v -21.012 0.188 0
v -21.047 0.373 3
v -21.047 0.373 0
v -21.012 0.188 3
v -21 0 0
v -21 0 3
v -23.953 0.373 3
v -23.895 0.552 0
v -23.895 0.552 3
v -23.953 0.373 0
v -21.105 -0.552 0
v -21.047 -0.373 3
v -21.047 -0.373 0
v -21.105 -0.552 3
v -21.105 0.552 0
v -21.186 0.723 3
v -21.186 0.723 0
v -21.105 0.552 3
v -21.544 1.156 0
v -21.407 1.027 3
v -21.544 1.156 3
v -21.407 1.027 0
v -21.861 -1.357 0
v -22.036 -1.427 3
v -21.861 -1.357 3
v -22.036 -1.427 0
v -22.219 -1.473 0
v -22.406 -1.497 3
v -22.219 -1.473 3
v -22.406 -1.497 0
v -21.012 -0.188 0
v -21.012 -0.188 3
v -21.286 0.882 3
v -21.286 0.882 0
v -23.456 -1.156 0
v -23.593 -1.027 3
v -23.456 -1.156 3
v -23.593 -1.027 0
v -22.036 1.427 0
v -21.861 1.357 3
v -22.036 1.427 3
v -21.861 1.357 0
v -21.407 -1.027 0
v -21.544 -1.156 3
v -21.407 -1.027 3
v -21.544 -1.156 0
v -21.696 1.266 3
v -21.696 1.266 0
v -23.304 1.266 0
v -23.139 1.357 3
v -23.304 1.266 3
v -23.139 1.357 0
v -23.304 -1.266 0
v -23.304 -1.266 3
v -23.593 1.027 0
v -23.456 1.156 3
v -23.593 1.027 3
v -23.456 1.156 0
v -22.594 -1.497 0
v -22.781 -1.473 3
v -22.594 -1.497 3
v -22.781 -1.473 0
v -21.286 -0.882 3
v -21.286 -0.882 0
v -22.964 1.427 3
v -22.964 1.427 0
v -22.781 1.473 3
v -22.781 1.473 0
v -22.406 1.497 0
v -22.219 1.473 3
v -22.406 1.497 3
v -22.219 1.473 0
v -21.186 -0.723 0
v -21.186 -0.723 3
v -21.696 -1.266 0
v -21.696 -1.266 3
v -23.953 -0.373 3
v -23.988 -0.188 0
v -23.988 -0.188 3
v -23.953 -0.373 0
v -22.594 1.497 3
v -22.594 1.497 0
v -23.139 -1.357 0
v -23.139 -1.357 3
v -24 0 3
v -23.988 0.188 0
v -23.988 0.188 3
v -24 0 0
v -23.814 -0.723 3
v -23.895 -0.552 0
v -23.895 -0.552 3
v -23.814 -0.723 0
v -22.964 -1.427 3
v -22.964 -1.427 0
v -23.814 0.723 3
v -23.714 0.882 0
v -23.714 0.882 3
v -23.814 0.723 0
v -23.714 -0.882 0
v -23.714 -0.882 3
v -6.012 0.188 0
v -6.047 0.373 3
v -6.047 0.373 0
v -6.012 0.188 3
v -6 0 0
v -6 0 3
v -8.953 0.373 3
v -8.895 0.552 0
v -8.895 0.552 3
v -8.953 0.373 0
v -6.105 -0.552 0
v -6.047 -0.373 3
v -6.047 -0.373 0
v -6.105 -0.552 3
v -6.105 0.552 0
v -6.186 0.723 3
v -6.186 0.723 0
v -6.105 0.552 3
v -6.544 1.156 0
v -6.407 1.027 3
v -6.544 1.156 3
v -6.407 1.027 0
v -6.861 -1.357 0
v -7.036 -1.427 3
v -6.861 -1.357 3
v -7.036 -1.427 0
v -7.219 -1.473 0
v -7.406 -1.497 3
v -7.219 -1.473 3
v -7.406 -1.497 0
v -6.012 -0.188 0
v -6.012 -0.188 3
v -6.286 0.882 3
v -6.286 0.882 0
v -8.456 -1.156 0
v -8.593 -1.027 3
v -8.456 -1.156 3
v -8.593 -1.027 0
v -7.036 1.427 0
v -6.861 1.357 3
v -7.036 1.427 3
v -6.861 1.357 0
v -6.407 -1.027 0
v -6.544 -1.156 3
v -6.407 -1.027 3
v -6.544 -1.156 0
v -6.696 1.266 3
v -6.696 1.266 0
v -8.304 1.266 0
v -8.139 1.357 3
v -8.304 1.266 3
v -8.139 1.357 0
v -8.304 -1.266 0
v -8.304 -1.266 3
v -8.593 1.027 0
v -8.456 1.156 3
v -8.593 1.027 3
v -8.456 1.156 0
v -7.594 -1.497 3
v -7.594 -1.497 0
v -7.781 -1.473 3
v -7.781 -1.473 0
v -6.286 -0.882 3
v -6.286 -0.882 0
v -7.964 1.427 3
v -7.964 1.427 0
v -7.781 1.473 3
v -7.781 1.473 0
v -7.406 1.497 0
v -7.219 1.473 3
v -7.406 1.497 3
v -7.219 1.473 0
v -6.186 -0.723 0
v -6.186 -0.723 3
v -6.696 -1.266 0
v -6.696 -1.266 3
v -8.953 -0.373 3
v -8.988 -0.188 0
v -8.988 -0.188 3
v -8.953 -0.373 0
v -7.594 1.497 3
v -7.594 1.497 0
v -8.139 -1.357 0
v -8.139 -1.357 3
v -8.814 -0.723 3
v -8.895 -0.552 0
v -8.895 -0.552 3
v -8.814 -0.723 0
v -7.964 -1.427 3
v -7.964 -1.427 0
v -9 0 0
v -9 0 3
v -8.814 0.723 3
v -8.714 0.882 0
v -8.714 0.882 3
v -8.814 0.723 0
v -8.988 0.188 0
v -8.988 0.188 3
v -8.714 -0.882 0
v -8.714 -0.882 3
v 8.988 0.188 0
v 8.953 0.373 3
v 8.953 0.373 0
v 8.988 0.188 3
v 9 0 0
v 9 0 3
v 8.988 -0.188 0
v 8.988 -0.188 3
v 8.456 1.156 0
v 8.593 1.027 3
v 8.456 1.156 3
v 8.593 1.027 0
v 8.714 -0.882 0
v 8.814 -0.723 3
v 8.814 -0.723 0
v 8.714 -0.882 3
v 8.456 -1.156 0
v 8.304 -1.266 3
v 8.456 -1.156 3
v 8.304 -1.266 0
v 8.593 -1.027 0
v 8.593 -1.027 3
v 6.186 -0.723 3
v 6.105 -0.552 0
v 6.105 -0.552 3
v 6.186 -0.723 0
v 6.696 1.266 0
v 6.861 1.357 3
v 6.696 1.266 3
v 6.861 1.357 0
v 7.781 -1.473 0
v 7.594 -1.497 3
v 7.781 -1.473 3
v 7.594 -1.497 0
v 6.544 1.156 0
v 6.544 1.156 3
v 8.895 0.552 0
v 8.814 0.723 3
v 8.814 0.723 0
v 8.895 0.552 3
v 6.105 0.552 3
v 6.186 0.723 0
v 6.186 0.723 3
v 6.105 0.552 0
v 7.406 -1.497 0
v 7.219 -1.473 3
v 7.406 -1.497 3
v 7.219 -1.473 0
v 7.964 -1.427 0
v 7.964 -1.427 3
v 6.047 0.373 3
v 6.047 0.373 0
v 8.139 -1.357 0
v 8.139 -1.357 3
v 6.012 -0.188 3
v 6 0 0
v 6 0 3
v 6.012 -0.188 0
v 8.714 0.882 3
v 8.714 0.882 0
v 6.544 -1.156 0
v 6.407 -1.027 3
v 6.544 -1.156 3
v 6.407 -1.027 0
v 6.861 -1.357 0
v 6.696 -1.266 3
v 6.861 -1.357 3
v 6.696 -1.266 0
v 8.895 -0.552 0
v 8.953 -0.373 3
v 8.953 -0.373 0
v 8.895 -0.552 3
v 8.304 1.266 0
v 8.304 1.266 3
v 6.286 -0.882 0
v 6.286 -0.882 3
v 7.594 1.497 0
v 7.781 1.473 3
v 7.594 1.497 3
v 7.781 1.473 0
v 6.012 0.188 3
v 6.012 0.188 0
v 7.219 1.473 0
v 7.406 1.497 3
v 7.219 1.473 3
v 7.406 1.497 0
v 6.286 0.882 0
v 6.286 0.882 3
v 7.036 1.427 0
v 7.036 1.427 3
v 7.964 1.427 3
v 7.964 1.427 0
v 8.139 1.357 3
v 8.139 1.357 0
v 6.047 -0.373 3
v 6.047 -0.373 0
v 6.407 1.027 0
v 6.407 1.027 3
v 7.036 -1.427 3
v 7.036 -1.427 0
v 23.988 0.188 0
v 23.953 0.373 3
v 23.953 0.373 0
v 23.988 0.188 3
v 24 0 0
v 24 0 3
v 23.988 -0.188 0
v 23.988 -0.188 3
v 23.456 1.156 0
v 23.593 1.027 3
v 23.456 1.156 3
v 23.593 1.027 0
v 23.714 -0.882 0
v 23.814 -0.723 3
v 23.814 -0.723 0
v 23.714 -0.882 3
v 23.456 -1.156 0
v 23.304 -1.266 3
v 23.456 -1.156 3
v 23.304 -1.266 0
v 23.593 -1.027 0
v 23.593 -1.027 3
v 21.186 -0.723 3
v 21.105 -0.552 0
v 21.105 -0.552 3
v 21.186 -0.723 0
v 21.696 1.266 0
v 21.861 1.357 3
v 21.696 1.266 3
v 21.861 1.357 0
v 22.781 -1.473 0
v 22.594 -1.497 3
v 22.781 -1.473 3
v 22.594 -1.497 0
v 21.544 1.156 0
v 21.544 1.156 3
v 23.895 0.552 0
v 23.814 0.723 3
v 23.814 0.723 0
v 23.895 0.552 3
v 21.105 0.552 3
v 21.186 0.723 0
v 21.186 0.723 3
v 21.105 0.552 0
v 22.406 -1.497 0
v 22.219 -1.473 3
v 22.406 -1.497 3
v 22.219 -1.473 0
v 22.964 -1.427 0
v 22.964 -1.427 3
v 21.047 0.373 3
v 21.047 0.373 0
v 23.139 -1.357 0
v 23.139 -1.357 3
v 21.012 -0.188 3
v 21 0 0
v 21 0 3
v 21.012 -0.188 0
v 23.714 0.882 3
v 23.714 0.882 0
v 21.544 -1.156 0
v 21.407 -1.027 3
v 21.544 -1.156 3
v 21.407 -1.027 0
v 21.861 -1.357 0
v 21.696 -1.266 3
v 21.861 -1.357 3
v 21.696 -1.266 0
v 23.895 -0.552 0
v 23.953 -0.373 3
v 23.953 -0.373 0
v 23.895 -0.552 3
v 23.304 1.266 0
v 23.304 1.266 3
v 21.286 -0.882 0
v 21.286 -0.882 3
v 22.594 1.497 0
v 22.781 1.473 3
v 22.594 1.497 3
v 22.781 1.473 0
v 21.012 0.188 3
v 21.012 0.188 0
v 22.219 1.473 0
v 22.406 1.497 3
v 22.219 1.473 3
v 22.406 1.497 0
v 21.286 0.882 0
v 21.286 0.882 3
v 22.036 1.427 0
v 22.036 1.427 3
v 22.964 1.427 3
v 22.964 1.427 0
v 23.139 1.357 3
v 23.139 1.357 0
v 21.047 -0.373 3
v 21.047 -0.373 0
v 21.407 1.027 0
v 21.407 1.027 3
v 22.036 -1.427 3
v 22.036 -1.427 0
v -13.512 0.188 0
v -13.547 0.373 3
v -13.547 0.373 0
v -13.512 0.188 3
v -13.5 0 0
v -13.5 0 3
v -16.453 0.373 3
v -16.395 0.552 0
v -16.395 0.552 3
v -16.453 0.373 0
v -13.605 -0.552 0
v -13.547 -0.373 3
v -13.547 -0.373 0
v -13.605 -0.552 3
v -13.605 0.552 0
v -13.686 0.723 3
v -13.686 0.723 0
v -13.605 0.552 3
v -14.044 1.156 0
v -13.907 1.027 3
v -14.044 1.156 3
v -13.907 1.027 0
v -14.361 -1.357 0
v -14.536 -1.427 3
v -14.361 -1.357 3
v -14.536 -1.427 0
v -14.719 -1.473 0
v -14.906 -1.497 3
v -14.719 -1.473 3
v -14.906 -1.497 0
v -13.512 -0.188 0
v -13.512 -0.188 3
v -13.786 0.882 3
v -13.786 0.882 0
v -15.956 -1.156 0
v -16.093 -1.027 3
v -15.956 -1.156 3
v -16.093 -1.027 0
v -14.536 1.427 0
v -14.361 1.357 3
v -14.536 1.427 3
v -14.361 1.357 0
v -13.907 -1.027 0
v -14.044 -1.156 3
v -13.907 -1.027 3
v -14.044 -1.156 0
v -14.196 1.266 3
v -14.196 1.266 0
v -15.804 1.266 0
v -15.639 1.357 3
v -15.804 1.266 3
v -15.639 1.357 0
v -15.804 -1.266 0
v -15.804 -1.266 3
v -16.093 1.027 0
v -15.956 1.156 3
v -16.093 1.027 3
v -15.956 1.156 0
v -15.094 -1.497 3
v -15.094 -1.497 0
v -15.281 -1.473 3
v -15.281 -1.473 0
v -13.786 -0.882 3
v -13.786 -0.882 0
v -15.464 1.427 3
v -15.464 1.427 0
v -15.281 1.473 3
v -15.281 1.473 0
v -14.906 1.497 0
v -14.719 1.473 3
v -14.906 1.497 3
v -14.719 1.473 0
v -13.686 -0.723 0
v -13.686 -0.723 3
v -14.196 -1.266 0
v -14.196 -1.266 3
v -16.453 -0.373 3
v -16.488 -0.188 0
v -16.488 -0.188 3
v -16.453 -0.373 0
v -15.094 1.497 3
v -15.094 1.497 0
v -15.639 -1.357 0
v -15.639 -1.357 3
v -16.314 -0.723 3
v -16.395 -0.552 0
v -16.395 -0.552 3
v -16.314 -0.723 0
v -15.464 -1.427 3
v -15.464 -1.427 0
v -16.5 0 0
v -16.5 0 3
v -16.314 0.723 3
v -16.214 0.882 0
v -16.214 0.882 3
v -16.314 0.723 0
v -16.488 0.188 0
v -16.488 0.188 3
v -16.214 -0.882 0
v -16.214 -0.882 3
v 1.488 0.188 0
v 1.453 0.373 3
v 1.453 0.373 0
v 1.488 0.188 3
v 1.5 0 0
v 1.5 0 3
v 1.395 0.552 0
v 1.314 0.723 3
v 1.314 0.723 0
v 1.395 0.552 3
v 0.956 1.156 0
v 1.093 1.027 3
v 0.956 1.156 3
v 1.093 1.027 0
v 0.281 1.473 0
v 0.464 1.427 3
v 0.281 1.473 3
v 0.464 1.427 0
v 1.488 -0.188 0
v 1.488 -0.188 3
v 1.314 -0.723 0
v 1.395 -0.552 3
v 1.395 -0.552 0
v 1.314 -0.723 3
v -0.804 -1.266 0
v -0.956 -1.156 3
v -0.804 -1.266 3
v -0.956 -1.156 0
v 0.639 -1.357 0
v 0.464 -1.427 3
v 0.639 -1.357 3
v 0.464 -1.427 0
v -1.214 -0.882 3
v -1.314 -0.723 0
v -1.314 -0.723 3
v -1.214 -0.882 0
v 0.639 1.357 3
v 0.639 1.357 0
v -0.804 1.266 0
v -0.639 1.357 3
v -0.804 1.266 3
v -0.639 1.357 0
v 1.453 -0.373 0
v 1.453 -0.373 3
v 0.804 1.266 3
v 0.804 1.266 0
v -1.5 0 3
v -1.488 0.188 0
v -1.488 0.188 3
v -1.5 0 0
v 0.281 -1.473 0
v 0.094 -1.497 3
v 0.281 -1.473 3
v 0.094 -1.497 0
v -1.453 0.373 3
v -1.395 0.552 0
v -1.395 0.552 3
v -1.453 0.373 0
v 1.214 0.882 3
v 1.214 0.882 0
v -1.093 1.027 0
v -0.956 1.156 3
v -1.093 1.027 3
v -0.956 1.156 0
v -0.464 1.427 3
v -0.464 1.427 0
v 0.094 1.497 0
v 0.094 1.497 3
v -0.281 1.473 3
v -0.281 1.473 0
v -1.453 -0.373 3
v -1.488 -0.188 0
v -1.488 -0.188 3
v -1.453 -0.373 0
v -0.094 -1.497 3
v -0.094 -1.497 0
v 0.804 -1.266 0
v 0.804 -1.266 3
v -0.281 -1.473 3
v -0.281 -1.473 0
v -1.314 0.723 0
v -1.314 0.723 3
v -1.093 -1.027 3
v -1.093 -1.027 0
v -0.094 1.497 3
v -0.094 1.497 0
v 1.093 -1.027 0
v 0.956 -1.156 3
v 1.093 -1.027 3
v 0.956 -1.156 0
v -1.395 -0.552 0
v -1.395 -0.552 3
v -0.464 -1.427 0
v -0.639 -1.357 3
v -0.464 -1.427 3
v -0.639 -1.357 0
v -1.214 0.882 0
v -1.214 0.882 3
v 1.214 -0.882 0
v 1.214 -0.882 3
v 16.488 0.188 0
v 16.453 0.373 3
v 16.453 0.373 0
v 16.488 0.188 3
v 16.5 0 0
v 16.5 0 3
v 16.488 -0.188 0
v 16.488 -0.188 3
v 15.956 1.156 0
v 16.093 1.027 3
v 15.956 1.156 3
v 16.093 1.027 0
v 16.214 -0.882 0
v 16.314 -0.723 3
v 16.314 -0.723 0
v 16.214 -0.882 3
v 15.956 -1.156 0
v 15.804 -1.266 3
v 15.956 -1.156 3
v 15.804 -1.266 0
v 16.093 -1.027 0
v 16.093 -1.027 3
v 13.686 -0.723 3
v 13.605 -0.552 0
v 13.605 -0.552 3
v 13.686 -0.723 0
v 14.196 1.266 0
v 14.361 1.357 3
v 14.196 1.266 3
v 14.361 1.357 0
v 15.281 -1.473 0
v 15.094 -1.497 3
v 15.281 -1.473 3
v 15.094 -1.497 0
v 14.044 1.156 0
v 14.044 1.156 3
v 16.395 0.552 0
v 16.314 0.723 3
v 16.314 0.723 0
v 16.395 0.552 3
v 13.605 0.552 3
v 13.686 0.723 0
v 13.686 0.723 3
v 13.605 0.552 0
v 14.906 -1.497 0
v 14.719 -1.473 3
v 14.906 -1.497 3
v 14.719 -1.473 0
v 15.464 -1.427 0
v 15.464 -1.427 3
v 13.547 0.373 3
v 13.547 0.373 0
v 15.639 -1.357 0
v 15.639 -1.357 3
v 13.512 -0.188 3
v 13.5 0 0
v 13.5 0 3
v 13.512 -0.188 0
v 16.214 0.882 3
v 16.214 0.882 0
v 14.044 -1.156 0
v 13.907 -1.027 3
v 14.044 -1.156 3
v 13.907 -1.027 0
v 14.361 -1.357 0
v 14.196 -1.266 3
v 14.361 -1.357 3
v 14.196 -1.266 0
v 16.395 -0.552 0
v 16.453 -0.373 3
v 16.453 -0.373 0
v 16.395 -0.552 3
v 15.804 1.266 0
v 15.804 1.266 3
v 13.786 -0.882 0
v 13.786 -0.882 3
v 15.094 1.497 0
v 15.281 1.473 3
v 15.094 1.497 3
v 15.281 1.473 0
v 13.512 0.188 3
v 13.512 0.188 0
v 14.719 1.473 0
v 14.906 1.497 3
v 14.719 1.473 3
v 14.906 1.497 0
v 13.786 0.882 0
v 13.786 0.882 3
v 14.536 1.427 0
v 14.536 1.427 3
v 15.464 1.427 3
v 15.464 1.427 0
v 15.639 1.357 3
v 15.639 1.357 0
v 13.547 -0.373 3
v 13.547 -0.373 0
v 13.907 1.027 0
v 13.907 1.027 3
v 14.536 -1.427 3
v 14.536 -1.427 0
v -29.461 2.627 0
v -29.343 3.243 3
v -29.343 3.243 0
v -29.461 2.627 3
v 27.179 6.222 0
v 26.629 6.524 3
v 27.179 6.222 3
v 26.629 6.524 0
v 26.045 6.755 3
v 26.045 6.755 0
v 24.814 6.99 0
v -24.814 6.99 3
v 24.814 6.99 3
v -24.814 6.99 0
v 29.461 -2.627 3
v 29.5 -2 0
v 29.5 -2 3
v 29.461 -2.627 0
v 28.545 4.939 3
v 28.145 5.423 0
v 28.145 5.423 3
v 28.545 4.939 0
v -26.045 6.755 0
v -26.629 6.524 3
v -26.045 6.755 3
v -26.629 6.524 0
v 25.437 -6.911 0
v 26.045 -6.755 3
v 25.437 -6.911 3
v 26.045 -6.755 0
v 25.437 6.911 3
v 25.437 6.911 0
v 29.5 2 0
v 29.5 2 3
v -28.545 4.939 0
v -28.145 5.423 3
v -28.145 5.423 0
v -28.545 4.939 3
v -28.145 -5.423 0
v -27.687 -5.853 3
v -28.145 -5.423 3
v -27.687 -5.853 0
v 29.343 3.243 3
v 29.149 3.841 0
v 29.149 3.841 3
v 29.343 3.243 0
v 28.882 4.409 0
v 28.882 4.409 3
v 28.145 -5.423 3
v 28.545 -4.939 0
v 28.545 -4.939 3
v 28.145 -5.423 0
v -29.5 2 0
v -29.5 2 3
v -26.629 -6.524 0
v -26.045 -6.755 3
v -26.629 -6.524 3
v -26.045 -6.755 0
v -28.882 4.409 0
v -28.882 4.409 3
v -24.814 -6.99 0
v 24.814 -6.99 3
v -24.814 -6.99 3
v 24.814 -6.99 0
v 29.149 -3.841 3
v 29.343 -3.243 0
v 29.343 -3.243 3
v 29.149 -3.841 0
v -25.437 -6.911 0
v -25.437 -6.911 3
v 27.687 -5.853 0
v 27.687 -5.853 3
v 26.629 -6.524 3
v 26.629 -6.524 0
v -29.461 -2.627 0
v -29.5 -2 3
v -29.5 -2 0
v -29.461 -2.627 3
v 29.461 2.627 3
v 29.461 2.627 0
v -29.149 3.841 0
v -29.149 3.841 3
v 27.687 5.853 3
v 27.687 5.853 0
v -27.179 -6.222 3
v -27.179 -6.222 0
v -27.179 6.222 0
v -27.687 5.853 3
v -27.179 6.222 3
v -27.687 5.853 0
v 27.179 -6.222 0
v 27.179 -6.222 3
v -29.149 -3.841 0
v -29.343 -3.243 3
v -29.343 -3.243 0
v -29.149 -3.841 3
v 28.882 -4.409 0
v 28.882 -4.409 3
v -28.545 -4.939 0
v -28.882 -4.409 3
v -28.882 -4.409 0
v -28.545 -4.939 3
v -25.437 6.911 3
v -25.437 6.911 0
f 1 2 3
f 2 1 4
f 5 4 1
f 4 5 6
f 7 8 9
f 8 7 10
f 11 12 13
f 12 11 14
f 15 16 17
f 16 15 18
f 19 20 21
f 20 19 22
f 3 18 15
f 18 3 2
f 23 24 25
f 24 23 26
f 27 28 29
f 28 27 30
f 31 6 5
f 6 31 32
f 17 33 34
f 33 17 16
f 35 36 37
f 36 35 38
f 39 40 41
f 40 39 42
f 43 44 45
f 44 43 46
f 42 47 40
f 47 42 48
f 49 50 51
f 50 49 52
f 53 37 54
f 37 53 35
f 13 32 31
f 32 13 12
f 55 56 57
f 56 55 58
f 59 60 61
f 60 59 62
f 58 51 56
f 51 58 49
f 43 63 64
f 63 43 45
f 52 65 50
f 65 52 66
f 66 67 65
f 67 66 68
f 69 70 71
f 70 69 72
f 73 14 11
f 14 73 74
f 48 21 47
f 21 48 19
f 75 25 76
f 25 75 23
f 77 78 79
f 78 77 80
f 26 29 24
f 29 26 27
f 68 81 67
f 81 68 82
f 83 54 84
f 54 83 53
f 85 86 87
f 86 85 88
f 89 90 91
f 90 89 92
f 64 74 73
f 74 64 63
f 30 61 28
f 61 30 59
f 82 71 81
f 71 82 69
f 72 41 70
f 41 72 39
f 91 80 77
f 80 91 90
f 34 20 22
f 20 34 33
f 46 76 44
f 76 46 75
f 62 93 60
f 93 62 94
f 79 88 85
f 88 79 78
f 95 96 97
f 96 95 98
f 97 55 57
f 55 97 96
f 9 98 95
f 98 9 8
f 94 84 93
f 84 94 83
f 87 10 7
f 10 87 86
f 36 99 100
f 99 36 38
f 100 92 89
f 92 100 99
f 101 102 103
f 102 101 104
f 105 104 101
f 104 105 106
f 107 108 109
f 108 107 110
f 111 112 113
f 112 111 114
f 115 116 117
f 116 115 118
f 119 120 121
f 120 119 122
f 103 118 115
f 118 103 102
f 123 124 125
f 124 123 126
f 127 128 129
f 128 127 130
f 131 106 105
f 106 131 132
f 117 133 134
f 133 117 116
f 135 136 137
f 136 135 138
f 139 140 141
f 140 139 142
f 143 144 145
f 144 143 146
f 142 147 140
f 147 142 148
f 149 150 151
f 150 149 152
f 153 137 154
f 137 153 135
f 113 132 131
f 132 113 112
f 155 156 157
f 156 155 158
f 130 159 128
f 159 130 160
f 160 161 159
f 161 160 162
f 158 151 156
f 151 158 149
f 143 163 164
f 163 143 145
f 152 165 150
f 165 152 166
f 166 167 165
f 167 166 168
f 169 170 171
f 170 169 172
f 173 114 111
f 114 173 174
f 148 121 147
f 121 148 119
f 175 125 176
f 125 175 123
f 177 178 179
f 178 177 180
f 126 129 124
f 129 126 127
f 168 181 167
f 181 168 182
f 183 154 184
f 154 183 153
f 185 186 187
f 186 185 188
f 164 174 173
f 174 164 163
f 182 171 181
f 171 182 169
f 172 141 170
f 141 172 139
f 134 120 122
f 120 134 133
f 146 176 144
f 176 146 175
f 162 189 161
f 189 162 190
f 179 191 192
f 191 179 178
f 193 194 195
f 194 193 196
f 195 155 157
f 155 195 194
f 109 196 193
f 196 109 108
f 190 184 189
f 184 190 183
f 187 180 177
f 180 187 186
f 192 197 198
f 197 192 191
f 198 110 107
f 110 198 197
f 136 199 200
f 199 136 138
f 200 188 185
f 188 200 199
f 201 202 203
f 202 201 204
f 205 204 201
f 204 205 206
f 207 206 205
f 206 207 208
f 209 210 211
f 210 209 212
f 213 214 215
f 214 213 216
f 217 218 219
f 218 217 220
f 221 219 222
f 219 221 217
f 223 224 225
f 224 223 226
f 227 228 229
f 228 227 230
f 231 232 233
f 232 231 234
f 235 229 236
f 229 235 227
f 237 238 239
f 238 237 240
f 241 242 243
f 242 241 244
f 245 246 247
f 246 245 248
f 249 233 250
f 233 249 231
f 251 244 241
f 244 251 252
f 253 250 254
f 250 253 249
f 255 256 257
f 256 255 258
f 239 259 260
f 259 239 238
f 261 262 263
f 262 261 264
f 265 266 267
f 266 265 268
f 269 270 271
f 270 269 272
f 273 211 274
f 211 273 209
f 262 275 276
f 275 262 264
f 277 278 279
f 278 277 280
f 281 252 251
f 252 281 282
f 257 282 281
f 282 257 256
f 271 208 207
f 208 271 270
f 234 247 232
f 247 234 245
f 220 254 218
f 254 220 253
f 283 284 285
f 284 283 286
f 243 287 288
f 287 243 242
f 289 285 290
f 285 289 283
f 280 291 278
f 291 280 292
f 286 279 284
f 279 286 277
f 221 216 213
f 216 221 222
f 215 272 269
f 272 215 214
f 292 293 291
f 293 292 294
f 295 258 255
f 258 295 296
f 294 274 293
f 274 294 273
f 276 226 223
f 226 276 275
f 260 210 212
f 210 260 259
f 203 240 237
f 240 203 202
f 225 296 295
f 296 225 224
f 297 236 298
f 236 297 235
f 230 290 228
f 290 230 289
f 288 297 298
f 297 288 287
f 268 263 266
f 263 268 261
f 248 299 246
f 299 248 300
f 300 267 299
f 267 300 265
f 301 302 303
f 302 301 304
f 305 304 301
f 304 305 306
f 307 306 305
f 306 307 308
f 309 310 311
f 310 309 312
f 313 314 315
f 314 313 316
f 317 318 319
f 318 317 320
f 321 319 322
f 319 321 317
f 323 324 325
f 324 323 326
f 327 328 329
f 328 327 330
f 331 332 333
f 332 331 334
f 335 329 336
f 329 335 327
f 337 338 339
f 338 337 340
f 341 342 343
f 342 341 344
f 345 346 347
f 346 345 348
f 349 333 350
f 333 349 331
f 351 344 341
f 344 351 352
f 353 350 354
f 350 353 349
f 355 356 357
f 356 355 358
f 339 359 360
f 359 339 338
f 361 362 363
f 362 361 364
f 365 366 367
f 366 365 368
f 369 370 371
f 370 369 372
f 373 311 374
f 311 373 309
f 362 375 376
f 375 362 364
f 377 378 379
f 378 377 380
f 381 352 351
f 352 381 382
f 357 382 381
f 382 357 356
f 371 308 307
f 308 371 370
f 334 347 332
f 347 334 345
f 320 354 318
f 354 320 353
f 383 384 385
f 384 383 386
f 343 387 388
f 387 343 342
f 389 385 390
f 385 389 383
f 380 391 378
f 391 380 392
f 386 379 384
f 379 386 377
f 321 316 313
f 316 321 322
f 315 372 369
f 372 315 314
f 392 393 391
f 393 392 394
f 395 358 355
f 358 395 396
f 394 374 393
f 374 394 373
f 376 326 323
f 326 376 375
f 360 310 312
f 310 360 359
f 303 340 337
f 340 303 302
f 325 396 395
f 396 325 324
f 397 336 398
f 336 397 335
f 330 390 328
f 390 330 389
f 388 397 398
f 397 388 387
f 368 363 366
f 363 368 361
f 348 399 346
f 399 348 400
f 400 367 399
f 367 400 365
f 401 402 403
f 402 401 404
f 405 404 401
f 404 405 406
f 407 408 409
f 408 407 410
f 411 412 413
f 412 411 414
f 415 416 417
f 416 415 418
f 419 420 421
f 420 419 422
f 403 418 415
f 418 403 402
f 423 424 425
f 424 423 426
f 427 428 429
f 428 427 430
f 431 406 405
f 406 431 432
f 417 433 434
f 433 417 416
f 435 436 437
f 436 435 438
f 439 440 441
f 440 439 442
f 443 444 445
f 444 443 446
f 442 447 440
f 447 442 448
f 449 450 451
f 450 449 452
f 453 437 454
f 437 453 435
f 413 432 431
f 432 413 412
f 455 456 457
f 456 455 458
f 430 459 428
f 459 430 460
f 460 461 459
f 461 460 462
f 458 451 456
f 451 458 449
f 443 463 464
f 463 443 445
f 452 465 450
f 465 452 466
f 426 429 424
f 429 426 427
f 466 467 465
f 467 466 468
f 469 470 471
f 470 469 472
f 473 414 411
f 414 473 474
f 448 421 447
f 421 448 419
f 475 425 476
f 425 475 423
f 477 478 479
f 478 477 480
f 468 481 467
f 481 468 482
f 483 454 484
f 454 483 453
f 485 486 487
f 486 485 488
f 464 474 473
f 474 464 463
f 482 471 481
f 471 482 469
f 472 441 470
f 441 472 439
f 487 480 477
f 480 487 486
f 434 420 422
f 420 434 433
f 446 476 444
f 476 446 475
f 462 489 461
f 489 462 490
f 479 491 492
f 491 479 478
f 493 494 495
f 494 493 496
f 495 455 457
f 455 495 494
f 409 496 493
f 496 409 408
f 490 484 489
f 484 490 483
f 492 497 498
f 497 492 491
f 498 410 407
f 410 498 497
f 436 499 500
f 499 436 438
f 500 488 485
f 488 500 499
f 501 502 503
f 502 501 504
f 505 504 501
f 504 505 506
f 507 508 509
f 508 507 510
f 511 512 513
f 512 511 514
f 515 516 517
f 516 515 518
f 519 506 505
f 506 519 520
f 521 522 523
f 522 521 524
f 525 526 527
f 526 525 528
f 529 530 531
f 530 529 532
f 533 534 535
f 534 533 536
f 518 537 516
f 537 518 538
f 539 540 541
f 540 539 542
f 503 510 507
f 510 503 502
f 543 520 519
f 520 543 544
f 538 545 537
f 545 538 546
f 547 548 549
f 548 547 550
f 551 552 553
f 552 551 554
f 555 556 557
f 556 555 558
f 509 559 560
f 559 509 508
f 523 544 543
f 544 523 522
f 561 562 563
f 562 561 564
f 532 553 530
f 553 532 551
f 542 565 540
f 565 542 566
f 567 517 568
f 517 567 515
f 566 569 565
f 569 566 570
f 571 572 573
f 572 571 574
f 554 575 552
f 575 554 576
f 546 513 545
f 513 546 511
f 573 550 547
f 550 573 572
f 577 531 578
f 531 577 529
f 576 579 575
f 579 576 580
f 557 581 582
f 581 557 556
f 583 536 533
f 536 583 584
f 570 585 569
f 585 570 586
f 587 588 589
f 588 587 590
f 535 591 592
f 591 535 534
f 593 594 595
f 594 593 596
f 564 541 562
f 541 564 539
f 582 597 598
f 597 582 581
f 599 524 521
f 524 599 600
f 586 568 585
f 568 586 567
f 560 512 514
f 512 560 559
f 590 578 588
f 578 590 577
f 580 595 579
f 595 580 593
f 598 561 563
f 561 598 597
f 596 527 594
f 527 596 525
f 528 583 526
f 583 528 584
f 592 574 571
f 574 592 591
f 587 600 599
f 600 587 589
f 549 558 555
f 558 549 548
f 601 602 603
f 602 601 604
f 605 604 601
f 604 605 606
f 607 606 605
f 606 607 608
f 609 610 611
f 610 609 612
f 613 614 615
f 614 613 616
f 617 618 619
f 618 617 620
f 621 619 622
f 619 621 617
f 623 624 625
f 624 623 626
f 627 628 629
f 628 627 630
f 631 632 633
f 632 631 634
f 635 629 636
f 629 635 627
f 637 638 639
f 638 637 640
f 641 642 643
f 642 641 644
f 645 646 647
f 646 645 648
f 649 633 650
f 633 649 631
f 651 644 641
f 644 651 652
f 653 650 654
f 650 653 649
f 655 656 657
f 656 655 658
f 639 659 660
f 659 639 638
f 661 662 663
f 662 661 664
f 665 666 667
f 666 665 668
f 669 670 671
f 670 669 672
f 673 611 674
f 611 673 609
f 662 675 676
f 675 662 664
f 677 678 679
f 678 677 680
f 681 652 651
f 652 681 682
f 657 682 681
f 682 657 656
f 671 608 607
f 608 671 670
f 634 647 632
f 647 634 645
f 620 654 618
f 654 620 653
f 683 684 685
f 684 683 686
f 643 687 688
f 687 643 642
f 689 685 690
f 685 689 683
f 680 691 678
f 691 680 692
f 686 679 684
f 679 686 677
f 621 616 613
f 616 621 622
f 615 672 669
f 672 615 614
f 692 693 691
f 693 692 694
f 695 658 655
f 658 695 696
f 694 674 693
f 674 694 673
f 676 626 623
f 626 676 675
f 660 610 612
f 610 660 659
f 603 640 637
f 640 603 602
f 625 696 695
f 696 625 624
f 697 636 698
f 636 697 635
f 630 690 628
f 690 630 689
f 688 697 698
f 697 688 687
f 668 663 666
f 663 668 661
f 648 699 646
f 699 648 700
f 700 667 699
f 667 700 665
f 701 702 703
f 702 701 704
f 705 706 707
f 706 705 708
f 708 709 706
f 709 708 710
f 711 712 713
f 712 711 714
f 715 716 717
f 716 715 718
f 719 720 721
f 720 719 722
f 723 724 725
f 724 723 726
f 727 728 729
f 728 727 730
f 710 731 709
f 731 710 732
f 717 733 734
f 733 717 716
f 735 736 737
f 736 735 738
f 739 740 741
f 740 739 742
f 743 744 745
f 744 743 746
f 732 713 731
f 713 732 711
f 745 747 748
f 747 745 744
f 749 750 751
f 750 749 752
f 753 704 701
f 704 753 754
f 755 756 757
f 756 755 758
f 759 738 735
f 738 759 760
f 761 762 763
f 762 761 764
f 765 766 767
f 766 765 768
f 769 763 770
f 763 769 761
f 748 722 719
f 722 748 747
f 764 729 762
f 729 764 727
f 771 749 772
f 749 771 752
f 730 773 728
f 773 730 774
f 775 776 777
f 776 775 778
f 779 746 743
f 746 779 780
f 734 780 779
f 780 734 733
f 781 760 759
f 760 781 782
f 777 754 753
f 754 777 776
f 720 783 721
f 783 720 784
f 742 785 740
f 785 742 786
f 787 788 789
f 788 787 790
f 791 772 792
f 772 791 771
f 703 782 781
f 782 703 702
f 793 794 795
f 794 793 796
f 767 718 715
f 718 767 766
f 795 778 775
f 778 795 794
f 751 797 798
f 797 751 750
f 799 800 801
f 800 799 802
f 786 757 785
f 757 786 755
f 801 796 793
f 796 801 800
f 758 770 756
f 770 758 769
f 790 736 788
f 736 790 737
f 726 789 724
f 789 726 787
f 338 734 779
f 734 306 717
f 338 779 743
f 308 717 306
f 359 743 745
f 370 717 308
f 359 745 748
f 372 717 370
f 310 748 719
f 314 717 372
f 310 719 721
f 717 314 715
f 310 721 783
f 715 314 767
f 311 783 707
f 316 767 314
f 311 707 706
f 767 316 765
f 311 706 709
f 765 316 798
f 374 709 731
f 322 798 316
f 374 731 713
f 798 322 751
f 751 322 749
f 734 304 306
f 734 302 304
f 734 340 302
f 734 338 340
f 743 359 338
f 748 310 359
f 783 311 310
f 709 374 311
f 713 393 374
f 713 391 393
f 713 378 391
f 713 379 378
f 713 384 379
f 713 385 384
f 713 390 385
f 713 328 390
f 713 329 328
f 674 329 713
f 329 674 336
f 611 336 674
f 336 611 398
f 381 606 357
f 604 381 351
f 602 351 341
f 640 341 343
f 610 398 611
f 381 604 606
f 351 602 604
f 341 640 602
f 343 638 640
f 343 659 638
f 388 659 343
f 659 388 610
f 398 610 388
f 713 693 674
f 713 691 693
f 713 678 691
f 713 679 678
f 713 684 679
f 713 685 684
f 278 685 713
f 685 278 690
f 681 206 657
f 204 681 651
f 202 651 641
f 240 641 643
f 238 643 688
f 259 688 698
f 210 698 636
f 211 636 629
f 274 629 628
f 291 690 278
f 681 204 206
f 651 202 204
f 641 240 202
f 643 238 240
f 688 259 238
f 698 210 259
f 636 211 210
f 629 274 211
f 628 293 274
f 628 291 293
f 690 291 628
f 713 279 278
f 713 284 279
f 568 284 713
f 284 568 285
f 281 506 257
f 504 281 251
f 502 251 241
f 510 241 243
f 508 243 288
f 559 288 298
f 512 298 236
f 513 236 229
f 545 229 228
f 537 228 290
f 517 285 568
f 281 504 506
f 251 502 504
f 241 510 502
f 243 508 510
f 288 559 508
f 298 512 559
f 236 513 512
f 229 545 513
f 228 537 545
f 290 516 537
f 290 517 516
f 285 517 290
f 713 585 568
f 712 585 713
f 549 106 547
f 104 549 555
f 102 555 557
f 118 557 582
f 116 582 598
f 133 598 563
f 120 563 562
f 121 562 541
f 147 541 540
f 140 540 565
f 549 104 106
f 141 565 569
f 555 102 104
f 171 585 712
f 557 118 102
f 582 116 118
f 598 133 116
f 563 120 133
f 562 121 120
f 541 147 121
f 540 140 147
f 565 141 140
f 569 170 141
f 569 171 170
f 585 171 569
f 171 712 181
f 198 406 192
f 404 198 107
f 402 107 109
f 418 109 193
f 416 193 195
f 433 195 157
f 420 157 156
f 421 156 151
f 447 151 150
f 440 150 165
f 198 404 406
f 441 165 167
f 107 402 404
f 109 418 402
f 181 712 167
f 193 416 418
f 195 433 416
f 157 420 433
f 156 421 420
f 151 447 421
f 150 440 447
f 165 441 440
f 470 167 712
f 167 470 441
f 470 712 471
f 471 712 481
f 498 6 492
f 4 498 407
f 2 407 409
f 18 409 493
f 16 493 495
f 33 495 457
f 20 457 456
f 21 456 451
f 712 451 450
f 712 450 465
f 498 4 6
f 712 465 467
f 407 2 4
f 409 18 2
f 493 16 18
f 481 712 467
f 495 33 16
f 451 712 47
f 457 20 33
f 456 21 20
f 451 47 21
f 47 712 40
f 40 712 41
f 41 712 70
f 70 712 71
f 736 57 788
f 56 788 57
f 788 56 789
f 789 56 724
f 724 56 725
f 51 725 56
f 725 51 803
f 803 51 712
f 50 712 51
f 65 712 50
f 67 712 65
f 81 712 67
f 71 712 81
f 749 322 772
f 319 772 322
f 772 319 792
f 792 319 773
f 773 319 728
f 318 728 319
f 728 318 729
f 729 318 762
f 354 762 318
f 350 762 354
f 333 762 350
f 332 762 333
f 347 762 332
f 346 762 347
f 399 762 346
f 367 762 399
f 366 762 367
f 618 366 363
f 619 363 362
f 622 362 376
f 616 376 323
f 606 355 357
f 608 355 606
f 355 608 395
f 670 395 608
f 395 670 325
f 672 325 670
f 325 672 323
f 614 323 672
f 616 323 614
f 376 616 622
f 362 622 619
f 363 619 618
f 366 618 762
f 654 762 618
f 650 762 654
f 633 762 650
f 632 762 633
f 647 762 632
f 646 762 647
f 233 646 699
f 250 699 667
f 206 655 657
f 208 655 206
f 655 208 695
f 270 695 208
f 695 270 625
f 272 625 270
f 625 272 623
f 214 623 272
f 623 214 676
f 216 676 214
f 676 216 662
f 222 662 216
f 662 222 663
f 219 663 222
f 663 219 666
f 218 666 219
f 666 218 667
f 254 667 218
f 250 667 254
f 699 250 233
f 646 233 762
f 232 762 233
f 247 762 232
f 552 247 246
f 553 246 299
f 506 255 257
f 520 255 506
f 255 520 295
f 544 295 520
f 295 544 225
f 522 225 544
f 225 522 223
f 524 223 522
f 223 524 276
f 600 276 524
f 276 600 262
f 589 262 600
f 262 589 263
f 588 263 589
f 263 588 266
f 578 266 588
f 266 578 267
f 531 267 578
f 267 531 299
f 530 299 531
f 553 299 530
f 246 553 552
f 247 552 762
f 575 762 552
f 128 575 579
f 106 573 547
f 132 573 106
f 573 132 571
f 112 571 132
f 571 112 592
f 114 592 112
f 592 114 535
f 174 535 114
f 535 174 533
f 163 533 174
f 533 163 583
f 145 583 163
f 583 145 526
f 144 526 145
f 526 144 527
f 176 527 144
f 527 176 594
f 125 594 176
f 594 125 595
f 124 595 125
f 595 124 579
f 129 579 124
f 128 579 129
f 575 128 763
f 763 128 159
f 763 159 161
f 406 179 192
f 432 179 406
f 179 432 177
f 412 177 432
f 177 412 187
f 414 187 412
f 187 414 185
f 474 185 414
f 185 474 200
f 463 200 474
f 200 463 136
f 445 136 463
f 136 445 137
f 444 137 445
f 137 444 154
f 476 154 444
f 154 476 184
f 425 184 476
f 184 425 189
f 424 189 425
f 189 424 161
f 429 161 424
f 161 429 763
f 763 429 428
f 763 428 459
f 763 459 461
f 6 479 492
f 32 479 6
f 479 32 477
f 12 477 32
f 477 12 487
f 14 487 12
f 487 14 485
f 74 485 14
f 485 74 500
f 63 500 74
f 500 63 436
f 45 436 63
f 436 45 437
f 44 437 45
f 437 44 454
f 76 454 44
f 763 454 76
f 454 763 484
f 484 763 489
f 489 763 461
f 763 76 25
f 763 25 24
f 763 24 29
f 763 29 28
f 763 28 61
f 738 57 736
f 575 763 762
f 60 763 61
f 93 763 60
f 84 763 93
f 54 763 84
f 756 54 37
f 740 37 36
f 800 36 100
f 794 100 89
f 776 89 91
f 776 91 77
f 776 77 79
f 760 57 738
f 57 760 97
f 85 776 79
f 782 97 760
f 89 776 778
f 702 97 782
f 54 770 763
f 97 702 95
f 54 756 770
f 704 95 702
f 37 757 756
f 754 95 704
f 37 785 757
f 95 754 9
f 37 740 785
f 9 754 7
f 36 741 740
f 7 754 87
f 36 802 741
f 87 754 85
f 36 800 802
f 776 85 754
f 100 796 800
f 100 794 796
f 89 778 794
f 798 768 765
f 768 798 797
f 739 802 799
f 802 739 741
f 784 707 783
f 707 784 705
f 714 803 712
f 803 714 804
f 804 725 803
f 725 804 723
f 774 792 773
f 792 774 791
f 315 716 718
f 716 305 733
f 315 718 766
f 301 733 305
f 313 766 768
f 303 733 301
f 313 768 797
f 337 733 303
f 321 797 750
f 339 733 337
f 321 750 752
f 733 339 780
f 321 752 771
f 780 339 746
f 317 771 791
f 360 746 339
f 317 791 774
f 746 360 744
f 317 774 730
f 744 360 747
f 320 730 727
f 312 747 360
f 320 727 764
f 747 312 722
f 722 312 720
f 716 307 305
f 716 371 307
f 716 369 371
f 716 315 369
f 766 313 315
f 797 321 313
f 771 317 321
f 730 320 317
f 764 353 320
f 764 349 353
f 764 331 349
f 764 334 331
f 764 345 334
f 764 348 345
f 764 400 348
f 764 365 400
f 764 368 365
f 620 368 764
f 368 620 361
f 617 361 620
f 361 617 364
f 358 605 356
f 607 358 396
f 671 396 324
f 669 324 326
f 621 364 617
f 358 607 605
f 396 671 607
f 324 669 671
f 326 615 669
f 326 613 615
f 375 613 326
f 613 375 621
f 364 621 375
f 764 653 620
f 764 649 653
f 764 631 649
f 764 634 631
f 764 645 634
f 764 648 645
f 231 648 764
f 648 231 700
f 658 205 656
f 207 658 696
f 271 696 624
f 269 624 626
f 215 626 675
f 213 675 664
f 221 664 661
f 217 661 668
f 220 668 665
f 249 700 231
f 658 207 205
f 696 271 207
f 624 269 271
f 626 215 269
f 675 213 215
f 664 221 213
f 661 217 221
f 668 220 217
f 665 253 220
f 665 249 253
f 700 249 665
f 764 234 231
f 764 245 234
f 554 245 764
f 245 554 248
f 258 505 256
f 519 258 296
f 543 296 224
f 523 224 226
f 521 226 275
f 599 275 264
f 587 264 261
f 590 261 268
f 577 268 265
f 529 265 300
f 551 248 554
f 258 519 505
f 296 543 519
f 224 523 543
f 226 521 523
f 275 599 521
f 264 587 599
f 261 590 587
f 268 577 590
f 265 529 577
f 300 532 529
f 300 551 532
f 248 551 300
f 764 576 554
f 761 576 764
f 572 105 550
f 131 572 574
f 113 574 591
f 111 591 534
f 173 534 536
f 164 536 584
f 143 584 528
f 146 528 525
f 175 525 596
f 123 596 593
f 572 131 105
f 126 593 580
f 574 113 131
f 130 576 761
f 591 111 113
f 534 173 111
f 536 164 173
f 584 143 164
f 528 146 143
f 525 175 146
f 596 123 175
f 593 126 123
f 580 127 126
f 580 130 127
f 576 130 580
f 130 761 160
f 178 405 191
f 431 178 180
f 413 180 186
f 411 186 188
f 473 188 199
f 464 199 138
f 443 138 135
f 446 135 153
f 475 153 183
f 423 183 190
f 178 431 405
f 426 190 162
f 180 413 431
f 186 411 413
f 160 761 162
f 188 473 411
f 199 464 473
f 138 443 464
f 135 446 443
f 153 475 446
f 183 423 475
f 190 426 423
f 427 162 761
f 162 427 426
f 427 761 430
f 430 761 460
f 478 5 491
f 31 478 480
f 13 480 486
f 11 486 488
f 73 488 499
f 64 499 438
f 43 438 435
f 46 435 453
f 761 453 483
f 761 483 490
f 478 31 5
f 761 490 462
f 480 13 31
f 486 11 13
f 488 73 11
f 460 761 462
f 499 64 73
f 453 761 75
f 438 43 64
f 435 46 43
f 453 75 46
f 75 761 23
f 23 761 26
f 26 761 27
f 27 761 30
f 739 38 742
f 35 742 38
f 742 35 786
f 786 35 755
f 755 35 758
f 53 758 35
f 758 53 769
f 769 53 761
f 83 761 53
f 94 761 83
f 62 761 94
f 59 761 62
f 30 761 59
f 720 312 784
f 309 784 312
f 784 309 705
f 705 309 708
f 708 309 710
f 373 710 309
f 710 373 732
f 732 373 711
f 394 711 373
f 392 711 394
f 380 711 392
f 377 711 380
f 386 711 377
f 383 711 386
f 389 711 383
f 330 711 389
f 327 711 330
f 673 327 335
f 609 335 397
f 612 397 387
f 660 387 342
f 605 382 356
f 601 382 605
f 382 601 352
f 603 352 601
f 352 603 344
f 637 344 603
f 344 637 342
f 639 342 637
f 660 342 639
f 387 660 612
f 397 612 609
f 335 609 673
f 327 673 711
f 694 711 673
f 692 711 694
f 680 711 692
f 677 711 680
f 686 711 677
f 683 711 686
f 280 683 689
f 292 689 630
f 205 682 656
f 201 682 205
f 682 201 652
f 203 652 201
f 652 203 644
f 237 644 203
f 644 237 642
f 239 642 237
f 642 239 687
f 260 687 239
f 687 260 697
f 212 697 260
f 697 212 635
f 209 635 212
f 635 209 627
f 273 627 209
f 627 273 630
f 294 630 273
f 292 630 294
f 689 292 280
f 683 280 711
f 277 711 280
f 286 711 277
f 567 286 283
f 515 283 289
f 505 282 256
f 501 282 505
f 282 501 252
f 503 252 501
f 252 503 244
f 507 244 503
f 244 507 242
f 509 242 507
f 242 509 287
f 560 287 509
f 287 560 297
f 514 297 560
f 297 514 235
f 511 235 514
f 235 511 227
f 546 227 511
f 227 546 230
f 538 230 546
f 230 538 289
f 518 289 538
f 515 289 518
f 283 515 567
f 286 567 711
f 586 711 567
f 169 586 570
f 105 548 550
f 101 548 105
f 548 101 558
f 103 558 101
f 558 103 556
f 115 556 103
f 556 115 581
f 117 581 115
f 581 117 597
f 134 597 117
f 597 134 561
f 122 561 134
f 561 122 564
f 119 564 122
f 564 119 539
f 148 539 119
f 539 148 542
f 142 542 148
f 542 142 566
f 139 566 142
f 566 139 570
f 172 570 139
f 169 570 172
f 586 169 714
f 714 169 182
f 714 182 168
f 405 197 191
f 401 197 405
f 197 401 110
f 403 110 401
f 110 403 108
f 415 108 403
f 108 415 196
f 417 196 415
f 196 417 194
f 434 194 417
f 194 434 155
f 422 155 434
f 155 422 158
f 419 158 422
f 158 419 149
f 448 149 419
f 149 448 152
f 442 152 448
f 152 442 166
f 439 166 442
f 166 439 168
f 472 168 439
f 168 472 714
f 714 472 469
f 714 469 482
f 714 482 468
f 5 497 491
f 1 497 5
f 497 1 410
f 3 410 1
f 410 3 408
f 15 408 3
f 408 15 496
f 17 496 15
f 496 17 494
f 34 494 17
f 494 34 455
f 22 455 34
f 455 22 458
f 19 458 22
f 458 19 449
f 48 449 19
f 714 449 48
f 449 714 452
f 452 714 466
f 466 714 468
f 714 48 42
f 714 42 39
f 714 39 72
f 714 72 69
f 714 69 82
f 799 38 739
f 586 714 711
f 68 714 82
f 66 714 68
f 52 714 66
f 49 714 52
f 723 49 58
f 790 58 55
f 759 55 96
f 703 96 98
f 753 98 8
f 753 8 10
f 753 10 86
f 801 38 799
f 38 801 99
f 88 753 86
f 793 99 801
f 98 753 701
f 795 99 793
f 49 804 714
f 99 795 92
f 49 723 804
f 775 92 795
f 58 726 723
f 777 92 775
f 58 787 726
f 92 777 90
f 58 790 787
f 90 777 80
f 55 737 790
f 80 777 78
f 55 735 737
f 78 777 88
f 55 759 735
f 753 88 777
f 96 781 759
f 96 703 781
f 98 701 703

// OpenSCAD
$fn = 50;


difference() {
	union() {
		hull() {
			translate(v = [-24.5000000000, 2.0000000000, 0]) {
				cylinder(h = 3, r = 5);
			}
			translate(v = [24.5000000000, 2.0000000000, 0]) {
				cylinder(h = 3, r = 5);
			}
			translate(v = [-24.5000000000, -2.0000000000, 0]) {
				cylinder(h = 3, r = 5);
			}
			translate(v = [24.5000000000, -2.0000000000, 0]) {
				cylinder(h = 3, r = 5);
			}
		}
	}
	union() {
		translate(v = [-22.5000000000, 0.0000000000, 0]) {
			translate(v = [0, 0, -100]) {
				cylinder(h = 200, r = 1.5000000000);
			}
		}
		translate(v = [-7.5000000000, 0.0000000000, 0]) {
			translate(v = [0, 0, -100]) {
				cylinder(h = 200, r = 1.5000000000);
			}
		}
		translate(v = [7.5000000000, 0.0000000000, 0]) {
			translate(v = [0, 0, -100]) {
				cylinder(h = 200, r = 1.5000000000);
			}
		}
		translate(v = [22.5000000000, 0.0000000000, 0]) {
			translate(v = [0, 0, -100]) {
				cylinder(h = 200, r = 1.5000000000);
			}
		}
		translate(v = [-22.5000000000, 0.0000000000, 0]) {
			translate(v = [0, 0, -100]) {
				cylinder(h = 200, r = 1.5000000000);
			}
		}
		translate(v = [-15.0000000000, 0.0000000000, 0]) {
			translate(v = [0, 0, -100]) {
				cylinder(h = 200, r = 1.5000000000);
			}
		}
		translate(v = [-7.5000000000, 0.0000000000, 0]) {
			translate(v = [0, 0, -100]) {
				cylinder(h = 200, r = 1.5000000000);
			}
		}
		translate(v = [0, 0, -100]) {
			cylinder(h = 200, r = 1.5000000000);
		}
		translate(v = [7.5000000000, 0.0000000000, 0]) {
			translate(v = [0, 0, -100]) {
				cylinder(h = 200, r = 1.5000000000);
			}
		}
		translate(v = [15.0000000000, 0.0000000000, 0]) {
			translate(v = [0, 0, -100]) {
				cylinder(h = 200, r = 1.5000000000);
			}
		}
		translate(v = [22.5000000000, 0.0000000000, 0]) {
			translate(v = [0, 0, -100]) {
				cylinder(h = 200, r = 1.5000000000);
			}
		}
	}
}
